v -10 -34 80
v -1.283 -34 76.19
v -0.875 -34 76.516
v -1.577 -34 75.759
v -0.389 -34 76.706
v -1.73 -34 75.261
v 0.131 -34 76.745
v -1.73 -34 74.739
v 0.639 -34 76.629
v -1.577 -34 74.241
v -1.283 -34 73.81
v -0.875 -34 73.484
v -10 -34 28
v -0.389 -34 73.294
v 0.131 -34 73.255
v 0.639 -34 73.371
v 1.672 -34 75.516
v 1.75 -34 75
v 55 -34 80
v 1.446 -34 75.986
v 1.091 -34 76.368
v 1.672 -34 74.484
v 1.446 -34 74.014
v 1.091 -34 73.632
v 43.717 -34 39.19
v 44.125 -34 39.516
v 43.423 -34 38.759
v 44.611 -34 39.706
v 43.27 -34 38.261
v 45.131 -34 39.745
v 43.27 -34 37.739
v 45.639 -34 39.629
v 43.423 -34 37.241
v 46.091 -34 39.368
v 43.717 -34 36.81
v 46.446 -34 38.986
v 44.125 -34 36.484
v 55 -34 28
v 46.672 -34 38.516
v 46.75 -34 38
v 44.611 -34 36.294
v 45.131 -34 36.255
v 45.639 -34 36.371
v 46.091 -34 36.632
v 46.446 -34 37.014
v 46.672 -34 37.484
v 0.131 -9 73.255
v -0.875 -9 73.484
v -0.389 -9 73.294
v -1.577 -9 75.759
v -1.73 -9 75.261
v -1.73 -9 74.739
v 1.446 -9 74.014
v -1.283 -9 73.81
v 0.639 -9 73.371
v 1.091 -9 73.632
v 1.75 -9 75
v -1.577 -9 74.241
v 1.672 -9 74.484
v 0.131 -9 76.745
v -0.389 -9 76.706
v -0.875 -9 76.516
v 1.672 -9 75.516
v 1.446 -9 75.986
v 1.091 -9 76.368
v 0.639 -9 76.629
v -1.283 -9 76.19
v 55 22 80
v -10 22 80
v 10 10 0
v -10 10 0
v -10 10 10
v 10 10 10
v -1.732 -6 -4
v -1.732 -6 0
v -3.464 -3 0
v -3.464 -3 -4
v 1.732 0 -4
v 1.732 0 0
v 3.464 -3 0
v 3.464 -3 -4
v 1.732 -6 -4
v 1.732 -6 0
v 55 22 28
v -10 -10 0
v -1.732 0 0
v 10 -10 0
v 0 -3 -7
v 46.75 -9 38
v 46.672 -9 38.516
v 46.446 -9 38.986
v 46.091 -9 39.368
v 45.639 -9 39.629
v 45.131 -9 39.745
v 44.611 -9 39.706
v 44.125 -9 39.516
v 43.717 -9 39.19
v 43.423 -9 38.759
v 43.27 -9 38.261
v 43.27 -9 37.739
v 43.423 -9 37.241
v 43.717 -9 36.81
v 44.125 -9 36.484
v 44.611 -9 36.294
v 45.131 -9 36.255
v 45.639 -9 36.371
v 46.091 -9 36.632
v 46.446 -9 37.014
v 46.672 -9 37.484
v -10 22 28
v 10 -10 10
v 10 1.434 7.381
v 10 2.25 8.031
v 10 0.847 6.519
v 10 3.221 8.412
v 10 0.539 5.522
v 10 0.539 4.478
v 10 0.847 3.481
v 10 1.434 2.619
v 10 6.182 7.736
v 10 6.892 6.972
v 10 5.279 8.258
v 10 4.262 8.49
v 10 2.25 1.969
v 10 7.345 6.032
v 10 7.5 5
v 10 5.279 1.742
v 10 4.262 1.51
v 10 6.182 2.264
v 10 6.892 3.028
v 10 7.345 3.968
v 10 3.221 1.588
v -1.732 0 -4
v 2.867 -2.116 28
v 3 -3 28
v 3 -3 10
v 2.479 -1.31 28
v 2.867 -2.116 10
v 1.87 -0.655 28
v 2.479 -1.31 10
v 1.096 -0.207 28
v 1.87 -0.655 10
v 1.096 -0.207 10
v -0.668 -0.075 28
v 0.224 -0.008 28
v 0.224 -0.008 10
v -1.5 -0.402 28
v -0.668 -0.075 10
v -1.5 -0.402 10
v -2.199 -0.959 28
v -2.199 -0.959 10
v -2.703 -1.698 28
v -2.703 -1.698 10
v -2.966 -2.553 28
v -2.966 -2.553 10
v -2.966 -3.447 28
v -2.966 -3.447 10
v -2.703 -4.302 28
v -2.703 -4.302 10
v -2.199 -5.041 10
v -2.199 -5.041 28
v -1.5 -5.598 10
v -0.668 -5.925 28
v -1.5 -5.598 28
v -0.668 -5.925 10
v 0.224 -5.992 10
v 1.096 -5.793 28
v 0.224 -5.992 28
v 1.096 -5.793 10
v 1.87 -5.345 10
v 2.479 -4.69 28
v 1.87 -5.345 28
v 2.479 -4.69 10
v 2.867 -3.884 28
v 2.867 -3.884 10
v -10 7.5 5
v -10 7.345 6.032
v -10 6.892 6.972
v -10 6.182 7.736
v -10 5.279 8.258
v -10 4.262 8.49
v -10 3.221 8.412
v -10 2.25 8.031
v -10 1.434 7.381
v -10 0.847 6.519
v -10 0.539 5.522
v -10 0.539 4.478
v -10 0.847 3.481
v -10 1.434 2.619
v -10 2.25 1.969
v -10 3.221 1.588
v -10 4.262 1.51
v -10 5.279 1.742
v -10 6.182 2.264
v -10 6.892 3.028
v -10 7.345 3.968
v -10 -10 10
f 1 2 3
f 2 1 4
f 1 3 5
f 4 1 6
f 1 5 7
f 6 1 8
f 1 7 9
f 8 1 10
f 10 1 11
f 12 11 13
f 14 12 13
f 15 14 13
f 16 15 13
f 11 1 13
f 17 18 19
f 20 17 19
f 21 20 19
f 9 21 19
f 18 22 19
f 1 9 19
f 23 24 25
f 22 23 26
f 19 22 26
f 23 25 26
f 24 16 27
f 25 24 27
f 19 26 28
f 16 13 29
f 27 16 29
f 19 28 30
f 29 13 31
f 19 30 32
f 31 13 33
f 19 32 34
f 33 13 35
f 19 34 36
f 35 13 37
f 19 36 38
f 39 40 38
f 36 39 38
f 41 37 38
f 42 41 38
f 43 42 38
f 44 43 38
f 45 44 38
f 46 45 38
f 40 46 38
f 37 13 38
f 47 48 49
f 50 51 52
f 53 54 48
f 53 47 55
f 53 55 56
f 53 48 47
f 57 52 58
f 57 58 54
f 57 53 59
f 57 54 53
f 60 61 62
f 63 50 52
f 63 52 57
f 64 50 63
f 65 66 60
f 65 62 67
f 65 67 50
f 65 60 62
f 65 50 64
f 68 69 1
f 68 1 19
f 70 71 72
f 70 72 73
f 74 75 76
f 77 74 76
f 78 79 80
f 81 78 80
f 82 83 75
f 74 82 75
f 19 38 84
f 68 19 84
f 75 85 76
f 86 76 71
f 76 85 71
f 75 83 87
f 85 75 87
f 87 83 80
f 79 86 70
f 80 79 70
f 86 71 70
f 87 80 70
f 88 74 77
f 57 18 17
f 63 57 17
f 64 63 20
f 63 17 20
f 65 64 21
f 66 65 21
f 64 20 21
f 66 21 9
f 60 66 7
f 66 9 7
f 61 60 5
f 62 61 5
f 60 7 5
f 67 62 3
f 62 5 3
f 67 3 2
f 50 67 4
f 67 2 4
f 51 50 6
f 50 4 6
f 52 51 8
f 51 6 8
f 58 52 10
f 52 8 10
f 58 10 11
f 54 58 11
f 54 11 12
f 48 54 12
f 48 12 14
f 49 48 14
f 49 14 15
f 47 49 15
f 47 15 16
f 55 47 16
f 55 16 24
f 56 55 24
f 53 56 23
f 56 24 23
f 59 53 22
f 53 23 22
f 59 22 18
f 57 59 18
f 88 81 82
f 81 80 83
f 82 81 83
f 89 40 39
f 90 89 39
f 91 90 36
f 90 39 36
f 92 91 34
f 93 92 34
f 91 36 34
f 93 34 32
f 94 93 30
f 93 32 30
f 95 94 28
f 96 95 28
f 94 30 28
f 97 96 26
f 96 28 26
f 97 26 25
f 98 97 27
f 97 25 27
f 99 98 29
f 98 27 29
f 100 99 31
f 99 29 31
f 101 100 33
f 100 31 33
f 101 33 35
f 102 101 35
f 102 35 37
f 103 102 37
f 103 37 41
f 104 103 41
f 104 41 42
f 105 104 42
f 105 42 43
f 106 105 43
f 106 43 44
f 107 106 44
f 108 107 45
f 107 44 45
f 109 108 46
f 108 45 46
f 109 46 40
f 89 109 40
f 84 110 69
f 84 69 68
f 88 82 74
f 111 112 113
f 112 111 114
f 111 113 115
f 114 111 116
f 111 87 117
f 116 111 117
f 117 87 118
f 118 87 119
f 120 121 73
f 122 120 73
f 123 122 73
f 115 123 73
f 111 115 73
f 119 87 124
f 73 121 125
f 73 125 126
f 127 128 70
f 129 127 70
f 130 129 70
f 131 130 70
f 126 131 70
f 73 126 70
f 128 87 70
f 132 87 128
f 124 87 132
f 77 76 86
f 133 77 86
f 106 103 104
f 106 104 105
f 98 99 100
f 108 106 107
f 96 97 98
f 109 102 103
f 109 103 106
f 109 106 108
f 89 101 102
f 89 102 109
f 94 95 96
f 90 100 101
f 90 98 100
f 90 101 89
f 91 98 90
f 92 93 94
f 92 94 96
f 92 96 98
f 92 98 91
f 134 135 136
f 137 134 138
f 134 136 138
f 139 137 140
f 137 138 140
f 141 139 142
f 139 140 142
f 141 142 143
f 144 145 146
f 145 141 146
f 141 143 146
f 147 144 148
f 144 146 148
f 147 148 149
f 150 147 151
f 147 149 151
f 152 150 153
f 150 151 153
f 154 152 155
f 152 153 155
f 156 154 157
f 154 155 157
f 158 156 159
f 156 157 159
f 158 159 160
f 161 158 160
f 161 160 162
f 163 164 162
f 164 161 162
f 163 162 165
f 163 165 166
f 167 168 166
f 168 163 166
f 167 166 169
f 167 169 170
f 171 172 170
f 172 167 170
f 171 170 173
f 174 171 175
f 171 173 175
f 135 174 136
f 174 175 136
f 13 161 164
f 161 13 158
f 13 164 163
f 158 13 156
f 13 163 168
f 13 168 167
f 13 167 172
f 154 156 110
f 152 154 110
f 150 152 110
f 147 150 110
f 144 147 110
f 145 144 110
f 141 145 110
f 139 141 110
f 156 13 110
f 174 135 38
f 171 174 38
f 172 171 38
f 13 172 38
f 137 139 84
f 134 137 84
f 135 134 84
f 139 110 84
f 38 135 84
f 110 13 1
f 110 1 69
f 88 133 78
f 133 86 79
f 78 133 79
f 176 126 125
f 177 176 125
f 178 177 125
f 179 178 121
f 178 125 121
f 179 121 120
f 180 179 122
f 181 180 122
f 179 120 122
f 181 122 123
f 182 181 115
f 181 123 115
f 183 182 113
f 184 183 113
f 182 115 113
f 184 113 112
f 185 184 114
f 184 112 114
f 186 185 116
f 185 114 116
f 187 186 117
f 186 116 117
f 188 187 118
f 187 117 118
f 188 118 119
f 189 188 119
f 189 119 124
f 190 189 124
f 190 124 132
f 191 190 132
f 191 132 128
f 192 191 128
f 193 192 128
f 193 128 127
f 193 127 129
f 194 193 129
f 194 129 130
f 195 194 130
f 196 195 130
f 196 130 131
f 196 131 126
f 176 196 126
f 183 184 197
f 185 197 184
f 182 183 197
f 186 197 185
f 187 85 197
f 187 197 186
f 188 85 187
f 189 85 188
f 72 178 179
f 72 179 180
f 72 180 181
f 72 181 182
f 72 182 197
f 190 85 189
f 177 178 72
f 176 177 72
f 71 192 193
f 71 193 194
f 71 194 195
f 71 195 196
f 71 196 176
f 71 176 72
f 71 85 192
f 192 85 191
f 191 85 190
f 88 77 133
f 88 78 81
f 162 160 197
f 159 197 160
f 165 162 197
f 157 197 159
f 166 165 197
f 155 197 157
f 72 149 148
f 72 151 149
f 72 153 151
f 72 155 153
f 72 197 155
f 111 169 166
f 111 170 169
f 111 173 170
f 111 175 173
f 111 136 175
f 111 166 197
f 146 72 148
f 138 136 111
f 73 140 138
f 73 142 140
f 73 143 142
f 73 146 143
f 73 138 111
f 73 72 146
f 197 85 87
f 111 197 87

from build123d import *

# Parameters (mm, degrees)
F0_W      = 20
F0_H      = 20
F1_DEPTH  = 10
F2_R      = 3.5
F3_DEPTH  = 20.001
F4_R      = 3
F5_DEPTH  = 35
F7_DEPTH  = 4
F11_W     = 65
F11_H     = 56
F12_DEPTH = 52
F13_R     = 1.75
F14_DEPTH = 25


# Not quite as in the source:
# - an extrude whose draft closes it to a point is written as a loft to that point


with BuildPart() as f1:
    # F0 (on Top) → F1 (new body)
    with BuildSketch(Plane.XY):
        Rectangle(F0_W, F0_H)
    extrude(amount=F1_DEPTH)

    # F2 (on face) → F3 (cut, through all)
    with BuildSketch(Plane.YZ.offset(10)):
        with Locations((4, 5)):
            Circle(F2_R)
    extrude(amount=-F3_DEPTH, mode=Mode.SUBTRACT)

    # F4 (on face) → F5 (join)
    with BuildSketch(Plane.XY.offset(10)):
        with Locations((0, -3)):
            Circle(F4_R)
    extrude(amount=F5_DEPTH)

    # F6 (on face) → F7 (join)
    with BuildSketch(Plane(origin=(0, 0, 0), x_dir=(1, 0, 0), z_dir=(0, 0, -1))):
        Polygon((-3.4641016151, 3), (-1.7320508076, 0), (1.7320508076, 0), (3.4641016151, 3), (1.7320508076, 6), (-1.7320508076, 6), align=None)
    extrude(amount=F7_DEPTH)

    # F7_face (on face) → F8 section 0
    with BuildSketch(Plane(origin=(0, -3, -4), x_dir=(1, 0, 0), z_dir=(0, 0, -1)), mode=Mode.PRIVATE) as f8_s0:
        Polygon((-1.7320508076, 3), (-3.4641016151, 0), (-1.7320508076, -3), (1.7320508076, -3), (3.4641016151, 0), (1.7320508076, 3), align=None)
    loft([f8_s0.sketch, Vertex(0, -3, -7)], ruled=True)

    # F11 (on offset) → F12 (join)
    with BuildSketch(Plane.XY.offset(28)):
        with Locations((22.5, -6)):
            Rectangle(F11_W, F11_H)
    extrude(amount=F12_DEPTH)

    # F13 (on face) → F14 (cut)
    with BuildSketch(Plane.XZ.offset(34)):
        with Locations((0, 75)):
            Circle(F13_R)
        with Locations((45, 38)):
            Circle(F13_R)
    extrude(amount=-F14_DEPTH, mode=Mode.SUBTRACT)


solid = f1.part
